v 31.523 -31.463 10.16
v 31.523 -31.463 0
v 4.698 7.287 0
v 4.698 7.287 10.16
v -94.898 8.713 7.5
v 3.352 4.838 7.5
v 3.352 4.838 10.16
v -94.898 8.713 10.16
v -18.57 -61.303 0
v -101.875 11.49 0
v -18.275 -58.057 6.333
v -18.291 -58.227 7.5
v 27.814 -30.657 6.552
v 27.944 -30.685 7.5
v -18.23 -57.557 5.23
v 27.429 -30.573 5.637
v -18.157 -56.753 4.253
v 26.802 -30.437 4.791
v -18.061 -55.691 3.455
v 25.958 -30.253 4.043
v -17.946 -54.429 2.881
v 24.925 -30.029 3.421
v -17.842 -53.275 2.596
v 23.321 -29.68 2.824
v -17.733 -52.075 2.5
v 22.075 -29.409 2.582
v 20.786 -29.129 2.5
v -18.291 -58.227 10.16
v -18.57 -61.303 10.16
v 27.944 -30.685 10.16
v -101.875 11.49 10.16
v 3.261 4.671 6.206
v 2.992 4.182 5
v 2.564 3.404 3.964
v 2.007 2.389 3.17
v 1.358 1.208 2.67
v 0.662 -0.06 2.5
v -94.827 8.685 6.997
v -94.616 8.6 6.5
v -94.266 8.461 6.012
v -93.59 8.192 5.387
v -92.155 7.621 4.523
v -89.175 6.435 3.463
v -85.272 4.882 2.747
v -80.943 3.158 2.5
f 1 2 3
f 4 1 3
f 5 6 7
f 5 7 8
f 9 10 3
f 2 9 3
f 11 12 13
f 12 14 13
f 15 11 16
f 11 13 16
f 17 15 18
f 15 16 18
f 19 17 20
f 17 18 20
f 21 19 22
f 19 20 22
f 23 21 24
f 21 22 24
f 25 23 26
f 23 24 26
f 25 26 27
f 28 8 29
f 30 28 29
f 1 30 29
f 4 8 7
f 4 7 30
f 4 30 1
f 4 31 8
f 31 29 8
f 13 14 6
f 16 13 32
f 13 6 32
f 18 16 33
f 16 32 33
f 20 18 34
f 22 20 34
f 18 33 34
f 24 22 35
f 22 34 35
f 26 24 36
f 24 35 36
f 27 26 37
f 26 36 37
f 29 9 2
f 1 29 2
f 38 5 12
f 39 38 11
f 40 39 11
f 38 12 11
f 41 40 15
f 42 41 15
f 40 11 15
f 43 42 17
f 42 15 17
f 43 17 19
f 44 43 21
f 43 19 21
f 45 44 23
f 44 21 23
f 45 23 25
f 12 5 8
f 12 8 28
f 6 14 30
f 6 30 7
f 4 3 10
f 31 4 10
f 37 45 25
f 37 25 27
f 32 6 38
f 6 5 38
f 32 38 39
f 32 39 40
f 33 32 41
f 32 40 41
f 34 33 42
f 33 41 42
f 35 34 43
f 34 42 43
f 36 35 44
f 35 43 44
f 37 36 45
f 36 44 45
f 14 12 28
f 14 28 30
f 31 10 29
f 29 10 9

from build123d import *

# Parameters (mm, degrees)
F1_DEPTH = 10.16
F2_T     = -2.5
F3_R     = 5


with BuildPart() as f1:
    # F0 (on Top) → F1 (new body)
    with BuildSketch(Plane.XY):
        Polygon((4.6977261081, 7.2870254517), (-101.8753126264, 11.4898011088), (-18.5698159039, -61.3032579422), (31.5232016146, -31.4628481865), align=None)
    extrude(amount=F1_DEPTH)

    # F2
    f2_openings = [f1.faces().sort_by_distance(p)[0] for p in [
        (-26.57097, -18.043029, 10.16),
    ]]
    offset(amount=F2_T, openings=f2_openings)

    # F3
    f3_edges = [f1.edges().sort_by_distance(p)[0] for p in [
        (-45.772655, 6.775414, 2.5),
        (-56.594272, -24.757201, 2.5),
        (4.826641, -44.456029, 2.5),
        (15.648258, -12.923414, 2.5),
    ]]
    fillet(f3_edges, radius=F3_R)


solid = f1.part
